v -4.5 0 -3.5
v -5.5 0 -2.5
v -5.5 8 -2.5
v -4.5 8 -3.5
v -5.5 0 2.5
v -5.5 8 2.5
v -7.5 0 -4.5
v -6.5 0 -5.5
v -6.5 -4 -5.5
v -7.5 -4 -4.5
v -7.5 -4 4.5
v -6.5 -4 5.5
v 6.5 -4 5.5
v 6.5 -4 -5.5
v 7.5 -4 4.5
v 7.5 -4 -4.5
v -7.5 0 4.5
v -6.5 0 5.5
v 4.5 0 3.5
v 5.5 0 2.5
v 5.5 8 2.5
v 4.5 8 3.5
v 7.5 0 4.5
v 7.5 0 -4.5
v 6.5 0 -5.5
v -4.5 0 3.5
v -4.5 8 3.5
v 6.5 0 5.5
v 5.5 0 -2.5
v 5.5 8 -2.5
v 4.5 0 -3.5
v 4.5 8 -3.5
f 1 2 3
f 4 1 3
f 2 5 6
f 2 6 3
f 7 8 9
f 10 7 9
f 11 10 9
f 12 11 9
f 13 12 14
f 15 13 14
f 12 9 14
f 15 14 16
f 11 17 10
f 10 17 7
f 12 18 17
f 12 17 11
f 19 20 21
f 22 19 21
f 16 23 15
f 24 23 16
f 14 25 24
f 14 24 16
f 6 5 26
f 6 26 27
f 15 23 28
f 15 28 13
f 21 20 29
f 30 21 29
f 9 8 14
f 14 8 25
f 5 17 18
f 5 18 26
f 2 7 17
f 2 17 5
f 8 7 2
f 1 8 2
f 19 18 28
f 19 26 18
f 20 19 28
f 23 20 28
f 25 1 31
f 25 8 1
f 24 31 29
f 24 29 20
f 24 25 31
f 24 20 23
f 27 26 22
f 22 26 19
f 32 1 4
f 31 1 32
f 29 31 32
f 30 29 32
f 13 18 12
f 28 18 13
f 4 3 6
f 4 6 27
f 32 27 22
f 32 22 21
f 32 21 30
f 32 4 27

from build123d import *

# Parameters (mm, degrees)
ESQUISSE1_W        = 15
ESQUISSE1_H        = 11
BOSS_EXTRU_1_DEPTH = 4
CHANFREIN1_SIZE    = 1
ESQUISSE2_W        = 11
ESQUISSE2_H        = 7
BOSS_EXTRU_2_DEPTH = 8
CHANFREIN3_SIZE    = 1


with BuildPart() as part:
    # Esquisse1 → Boss.-Extru.1 (new body)
    with BuildSketch(Plane(origin=(0, 0, 0), x_dir=(1, 0, 0), z_dir=(0, 1, 0))):
        Rectangle(ESQUISSE1_W, ESQUISSE1_H)
    extrude(amount=-BOSS_EXTRU_1_DEPTH)

    # Chanfrein1
    chanfrein1_edges = [part.edges().sort_by_distance(p)[0] for p in [
        (7.5, -2, 5.5),
        (-7.5, -2, 5.5),
        (-7.5, -2, -5.5),
        (7.5, -2, -5.5),
    ]]
    chamfer(chanfrein1_edges, length=CHANFREIN1_SIZE)

    # Esquisse2 → Boss.-Extru.2 (add)
    with BuildSketch(Plane(origin=(0, 0, 0), x_dir=(1, 0, 0), z_dir=(0, 1, 0))):
        Rectangle(ESQUISSE2_W, ESQUISSE2_H)
    extrude(amount=BOSS_EXTRU_2_DEPTH)

    # Chanfrein3
    chanfrein3_edges = [part.edges().sort_by_distance(p)[0] for p in [
        (5.5, 4, 3.5),
        (5.5, 4, -3.5),
        (-5.5, 4, -3.5),
        (-5.5, 4, 3.5),
    ]]
    chamfer(chanfrein3_edges, length=CHANFREIN3_SIZE)


solid = part.part
